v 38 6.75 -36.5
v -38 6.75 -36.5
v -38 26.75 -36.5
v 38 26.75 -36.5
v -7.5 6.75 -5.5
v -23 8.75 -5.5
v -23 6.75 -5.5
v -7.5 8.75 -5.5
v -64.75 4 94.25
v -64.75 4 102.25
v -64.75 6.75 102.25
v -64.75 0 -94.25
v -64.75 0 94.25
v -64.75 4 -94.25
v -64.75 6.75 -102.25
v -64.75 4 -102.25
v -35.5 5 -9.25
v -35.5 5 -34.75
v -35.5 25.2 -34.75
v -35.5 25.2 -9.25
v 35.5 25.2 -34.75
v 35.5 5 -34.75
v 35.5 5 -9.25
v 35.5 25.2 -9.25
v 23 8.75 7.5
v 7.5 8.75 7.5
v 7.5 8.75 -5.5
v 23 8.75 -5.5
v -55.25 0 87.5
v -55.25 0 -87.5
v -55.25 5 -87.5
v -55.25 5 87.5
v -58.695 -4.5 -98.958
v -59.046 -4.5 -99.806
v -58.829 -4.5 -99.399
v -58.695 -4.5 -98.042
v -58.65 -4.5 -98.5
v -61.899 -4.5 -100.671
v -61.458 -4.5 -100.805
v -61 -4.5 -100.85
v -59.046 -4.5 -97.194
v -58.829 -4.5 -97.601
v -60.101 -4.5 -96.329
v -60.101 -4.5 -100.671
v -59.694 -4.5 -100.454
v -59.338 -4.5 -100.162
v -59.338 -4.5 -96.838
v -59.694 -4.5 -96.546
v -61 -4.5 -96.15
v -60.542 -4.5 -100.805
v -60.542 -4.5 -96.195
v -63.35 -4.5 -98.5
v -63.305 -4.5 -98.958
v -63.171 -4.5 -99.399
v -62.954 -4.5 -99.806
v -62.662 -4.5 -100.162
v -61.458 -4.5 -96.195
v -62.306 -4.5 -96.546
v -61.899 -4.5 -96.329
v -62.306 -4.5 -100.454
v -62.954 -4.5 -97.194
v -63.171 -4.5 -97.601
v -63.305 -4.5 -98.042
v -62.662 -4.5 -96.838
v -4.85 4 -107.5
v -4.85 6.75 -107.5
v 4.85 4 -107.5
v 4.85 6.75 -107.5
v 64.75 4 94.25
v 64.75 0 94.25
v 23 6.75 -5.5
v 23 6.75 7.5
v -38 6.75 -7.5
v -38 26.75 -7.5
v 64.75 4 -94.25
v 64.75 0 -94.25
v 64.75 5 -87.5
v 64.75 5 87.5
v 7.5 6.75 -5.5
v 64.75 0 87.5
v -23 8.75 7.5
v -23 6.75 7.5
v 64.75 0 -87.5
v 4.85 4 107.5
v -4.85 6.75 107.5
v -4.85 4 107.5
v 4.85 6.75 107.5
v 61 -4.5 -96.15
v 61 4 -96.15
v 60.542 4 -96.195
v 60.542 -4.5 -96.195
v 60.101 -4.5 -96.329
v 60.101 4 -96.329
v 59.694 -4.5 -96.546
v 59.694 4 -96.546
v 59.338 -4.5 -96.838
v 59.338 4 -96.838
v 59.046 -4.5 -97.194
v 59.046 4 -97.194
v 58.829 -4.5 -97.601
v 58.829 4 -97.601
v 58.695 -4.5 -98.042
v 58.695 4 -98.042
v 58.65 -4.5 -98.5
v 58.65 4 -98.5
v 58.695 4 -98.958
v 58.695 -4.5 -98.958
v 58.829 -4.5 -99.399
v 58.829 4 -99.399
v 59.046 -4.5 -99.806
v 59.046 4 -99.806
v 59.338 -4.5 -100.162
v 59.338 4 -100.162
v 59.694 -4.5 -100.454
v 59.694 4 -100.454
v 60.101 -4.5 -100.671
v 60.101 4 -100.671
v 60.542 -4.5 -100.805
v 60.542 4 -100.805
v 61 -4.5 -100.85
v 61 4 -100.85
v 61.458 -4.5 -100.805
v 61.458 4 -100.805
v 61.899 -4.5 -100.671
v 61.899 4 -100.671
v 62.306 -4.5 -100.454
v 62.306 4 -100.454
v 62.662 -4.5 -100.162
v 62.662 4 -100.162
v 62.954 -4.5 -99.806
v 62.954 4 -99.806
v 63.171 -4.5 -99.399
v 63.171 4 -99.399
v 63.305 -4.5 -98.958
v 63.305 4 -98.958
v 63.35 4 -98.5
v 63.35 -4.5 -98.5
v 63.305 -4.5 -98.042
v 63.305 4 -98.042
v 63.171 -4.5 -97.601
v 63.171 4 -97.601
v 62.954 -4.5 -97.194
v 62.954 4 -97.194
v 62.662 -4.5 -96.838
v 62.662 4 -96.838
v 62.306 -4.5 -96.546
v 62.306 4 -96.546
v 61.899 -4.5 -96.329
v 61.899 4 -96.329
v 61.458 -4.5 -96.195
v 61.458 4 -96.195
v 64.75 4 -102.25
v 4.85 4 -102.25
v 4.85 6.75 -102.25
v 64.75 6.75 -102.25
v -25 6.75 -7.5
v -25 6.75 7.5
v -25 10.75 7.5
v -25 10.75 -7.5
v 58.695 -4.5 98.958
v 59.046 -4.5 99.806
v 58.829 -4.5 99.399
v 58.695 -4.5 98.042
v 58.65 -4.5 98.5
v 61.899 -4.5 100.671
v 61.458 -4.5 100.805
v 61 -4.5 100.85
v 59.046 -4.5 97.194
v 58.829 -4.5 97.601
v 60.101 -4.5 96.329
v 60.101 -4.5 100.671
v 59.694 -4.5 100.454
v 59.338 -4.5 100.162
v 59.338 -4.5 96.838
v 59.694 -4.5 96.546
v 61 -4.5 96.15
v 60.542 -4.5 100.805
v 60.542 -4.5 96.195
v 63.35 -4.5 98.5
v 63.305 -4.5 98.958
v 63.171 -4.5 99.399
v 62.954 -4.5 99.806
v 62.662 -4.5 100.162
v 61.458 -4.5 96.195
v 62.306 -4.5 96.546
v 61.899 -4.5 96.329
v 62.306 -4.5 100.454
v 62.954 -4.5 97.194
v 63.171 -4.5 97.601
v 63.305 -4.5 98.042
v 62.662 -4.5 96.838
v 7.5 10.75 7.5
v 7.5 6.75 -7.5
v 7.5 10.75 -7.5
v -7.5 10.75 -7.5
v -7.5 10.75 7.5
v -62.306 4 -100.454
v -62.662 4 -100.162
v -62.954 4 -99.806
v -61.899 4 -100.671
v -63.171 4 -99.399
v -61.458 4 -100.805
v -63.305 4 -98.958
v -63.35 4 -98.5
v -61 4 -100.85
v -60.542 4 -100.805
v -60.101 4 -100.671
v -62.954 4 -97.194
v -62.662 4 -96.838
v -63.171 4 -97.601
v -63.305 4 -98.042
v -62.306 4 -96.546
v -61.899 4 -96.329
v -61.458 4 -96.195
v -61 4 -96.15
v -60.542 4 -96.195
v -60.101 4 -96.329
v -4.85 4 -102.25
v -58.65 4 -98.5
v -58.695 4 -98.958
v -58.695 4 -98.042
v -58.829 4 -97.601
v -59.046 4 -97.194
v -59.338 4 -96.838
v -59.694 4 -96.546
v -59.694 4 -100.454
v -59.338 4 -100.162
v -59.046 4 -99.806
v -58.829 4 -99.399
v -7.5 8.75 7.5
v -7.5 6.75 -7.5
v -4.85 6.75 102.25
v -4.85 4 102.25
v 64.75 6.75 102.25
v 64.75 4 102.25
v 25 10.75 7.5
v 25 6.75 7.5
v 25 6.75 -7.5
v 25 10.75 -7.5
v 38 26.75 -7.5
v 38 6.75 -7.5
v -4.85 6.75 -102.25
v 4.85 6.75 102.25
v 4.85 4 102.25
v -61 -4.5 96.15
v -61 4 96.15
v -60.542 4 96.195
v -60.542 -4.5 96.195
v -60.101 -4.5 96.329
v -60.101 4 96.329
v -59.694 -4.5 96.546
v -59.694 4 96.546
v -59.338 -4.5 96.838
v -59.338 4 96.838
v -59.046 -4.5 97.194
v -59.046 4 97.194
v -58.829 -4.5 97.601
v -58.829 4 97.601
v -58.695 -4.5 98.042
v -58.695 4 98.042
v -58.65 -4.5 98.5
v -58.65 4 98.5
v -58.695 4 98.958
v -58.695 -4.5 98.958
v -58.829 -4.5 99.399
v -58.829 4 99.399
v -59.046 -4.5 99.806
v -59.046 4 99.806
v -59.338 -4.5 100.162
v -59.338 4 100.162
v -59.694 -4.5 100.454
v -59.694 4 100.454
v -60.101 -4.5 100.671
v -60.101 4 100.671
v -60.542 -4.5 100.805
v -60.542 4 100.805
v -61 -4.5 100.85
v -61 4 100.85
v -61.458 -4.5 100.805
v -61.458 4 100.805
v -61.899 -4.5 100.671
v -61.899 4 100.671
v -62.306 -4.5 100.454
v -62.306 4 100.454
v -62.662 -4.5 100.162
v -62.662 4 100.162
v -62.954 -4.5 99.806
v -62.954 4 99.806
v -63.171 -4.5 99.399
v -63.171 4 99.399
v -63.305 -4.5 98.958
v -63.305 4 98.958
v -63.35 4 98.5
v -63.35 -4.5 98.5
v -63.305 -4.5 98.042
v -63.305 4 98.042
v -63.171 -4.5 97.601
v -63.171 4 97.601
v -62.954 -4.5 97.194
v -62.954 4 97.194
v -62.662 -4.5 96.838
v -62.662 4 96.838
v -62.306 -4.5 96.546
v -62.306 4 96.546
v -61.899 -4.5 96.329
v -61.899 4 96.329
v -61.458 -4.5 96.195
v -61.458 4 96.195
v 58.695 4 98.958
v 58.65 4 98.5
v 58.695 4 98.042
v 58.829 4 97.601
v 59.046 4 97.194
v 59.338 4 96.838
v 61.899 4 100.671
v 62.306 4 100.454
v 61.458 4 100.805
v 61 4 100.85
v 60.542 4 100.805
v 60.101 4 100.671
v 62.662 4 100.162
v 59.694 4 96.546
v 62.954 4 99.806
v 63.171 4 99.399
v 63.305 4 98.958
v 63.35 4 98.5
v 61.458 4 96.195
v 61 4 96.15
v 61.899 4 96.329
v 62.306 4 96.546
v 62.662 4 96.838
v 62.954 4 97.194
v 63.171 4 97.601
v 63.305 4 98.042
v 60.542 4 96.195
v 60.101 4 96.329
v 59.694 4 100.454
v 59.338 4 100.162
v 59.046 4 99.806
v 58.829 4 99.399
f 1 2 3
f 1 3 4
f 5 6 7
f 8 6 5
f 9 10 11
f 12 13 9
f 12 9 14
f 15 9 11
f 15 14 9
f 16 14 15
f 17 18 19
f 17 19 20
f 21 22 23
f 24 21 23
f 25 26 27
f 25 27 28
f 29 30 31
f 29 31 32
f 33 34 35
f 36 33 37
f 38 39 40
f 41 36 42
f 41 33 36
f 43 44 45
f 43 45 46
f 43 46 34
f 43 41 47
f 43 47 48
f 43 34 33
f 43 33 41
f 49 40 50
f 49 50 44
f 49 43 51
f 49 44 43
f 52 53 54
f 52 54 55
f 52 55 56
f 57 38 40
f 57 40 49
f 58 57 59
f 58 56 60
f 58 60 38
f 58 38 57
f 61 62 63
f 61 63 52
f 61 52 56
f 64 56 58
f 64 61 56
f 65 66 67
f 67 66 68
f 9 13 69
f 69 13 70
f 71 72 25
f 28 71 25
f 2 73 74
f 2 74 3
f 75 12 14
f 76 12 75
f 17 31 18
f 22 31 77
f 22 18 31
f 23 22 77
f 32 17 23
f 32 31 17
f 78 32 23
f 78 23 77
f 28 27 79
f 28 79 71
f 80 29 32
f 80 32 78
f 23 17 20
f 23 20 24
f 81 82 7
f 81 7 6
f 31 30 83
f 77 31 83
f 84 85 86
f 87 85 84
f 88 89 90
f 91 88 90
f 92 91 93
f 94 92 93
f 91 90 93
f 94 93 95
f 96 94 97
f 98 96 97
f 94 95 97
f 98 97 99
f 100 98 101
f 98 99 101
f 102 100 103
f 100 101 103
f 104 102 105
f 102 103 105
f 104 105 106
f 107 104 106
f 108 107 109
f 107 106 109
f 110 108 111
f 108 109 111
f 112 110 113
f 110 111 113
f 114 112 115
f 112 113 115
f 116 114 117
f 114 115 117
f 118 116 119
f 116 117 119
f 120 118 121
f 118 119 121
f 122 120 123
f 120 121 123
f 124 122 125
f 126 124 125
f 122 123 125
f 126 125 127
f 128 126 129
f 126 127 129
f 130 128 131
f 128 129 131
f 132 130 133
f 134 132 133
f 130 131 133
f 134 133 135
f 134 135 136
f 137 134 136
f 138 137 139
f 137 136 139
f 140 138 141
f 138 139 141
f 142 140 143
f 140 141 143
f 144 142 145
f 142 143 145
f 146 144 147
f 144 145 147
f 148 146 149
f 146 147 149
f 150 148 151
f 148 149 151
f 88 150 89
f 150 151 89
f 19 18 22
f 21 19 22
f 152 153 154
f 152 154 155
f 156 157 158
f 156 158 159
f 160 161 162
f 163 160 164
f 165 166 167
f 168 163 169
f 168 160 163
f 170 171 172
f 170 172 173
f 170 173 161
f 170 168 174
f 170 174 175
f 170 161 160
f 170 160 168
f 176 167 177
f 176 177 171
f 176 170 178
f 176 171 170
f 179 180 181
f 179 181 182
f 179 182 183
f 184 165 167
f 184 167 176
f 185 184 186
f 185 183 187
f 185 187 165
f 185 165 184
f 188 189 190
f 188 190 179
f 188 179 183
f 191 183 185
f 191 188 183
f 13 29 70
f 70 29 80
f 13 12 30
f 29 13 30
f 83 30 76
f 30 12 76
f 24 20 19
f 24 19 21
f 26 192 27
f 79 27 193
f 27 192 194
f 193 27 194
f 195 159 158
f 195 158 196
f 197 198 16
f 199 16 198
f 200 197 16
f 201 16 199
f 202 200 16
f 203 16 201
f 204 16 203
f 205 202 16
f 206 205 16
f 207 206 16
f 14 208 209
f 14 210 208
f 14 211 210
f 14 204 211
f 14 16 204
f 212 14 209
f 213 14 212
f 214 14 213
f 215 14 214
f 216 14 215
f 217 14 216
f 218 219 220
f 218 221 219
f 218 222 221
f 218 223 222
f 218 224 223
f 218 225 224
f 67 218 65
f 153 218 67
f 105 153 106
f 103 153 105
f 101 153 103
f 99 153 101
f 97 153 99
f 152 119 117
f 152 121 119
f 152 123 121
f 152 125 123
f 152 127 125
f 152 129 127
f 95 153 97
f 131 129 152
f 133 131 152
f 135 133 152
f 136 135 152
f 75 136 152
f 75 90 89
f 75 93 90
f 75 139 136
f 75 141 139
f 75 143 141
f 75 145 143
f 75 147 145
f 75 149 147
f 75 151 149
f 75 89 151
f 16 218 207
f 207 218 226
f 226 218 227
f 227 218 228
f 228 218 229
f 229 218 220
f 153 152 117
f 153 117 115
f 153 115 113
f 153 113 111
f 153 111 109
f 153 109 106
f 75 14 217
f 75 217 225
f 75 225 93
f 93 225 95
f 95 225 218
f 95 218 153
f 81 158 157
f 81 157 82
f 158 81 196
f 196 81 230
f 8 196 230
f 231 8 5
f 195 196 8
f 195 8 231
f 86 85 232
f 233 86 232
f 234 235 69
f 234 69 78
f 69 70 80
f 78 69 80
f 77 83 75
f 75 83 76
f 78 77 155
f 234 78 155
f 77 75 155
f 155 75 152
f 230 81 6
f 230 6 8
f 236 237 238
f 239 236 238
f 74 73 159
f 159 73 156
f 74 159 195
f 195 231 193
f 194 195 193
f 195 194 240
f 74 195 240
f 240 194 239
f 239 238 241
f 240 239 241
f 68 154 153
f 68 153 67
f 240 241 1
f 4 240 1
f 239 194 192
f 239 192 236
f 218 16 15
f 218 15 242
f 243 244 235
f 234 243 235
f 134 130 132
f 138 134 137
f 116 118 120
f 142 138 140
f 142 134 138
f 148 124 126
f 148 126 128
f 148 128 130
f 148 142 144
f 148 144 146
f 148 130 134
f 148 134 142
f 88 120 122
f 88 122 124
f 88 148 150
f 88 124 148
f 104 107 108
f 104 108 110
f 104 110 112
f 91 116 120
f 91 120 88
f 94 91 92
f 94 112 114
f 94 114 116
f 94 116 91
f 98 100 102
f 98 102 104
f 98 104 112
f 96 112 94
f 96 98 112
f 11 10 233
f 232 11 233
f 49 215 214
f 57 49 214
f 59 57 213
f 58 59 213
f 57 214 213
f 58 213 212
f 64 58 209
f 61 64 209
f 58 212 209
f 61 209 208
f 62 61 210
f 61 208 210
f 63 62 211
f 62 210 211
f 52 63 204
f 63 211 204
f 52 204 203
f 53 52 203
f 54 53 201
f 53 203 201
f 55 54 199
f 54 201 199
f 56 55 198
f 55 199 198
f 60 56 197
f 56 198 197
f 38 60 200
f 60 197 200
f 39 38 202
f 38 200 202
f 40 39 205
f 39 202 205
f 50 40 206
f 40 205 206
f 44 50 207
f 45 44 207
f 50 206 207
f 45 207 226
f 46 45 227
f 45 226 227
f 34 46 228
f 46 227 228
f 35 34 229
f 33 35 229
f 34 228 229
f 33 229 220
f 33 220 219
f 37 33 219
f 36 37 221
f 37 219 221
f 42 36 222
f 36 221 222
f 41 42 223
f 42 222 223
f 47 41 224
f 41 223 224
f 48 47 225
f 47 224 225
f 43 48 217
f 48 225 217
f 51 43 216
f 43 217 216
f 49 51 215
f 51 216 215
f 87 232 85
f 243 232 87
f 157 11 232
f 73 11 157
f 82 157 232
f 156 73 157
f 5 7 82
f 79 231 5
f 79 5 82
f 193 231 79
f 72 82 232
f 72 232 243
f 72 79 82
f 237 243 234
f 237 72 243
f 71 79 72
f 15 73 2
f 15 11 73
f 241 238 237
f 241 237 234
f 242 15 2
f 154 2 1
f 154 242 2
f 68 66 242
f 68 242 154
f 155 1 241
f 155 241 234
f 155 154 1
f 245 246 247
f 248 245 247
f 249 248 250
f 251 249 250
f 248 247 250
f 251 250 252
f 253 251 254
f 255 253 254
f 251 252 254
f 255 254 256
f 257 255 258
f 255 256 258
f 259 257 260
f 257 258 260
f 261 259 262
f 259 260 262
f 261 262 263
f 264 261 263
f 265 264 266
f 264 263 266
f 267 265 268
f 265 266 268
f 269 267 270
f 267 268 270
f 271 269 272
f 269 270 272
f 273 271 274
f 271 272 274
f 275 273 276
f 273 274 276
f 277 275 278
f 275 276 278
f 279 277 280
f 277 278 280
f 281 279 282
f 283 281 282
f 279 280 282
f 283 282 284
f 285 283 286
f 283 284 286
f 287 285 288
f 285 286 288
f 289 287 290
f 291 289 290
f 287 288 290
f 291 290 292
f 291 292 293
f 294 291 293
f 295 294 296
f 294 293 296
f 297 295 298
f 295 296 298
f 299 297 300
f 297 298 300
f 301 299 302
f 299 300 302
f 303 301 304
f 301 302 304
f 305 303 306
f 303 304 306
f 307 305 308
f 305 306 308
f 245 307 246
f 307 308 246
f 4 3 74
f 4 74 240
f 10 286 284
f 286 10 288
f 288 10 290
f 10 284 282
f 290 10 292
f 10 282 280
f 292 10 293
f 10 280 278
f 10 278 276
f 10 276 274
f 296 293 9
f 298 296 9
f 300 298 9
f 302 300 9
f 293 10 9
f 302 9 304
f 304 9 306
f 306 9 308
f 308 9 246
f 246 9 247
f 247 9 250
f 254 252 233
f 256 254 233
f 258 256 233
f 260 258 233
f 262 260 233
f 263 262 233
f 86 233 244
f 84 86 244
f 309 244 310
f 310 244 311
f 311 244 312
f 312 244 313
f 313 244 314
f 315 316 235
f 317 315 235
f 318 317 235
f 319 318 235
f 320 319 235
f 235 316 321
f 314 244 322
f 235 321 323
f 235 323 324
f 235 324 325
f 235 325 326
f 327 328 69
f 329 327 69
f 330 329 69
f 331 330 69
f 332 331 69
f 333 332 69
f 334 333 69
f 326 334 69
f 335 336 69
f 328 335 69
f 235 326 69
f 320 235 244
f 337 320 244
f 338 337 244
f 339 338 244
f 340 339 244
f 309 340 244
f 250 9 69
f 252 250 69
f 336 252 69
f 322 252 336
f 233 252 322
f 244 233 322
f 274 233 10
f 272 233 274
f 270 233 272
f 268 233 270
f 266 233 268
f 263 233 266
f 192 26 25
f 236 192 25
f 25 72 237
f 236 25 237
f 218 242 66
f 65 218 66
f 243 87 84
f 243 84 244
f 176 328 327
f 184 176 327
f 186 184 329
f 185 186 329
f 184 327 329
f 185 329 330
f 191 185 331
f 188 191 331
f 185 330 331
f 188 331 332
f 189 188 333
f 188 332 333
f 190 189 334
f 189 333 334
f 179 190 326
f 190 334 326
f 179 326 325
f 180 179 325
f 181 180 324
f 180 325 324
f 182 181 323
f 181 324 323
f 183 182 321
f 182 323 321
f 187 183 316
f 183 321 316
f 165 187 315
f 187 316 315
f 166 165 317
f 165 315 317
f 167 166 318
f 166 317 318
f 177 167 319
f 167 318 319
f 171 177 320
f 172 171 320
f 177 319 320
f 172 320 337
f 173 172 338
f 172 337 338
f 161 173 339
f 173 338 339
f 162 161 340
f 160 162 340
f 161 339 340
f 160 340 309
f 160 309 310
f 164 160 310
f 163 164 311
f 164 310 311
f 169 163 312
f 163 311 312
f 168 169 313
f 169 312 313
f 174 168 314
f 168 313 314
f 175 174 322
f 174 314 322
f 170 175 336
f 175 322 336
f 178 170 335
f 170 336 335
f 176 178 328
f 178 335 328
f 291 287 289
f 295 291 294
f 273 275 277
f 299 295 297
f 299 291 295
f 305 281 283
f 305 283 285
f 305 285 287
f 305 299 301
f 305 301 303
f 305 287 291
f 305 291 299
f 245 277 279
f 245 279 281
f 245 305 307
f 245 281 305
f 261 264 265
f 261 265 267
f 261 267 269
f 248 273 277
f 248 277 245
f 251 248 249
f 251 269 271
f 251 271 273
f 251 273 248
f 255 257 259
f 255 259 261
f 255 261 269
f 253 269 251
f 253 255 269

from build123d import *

# Parameters (mm, degrees)
SKETCH_1_W          = 129.5
SKETCH_1_H          = 204.5
EXTRUDE_1_DEPTH     = 6.75
SKETCH_2_W          = 129.5
SKETCH_2_H          = 8
CUT_EXTRUDE_1_DEPTH = 4
SKETCH_3_R          = 2.35
EXTRUDE_2_DEPTH     = 8.5
SKETCH_4_W          = 120
SKETCH_4_H          = 175
CUT_EXTRUDE_3_DEPTH = 5
SKETCH_5_W          = 9.7
SKETCH_5_H          = 215
EXTRUDE_3_DEPTH     = 2.75
SKETCH_6_W          = 50
SKETCH_6_H          = 15
EXTRUDE_4_DEPTH     = 4
SKETCH_7_W          = 46
SKETCH_7_H          = 2
CUT_EXTRUDE_4_DEPTH = 13
SKETCH_8_W          = 15
SKETCH_8_H          = 15
CUT_EXTRUDE_5_DEPTH = 4
SKETCH_9_W          = 76
SKETCH_9_H          = 29
EXTRUDE_5_DEPTH     = 20
SKETCH_10_W         = 9.7
SKETCH_10_H         = 175
CUT_EXTRUDE_6_DEPTH = 1
SKETCH_11_W         = 71
SKETCH_11_H         = 25.5
CUT_EXTRUDE_8_DEPTH = 20.2


with BuildPart() as part:
    # 草图1 → 凸台-拉伸1 (new body)
    with BuildSketch(Plane(origin=(0, 0, 0), x_dir=(1, 0, 0), z_dir=(0, 1, 0))):
        Rectangle(SKETCH_1_W, SKETCH_1_H)
    extrude(amount=EXTRUDE_1_DEPTH)

    # 草图2 → 切除-拉伸1 (cut)
    with BuildSketch(Plane.XZ):
        with Locations((0, 98.25)):
            Rectangle(SKETCH_2_W, SKETCH_2_H)
        with Locations((0, -98.25)):
            Rectangle(SKETCH_2_W, SKETCH_2_H)
    extrude(amount=-CUT_EXTRUDE_1_DEPTH, mode=Mode.SUBTRACT)

    # 草图3 → 凸台-拉伸2 (add)
    with BuildSketch(Plane.XZ.offset(-4)):
        with Locations(Location((-61, 98.5, 0), (0, 0, 270))):
            Circle(SKETCH_3_R)
        with Locations(Location((61, 98.5, 0), (0, 0, 270))):
            Circle(SKETCH_3_R)
        with Locations(Location((61, -98.5, 0), (0, 0, 90))):
            Circle(SKETCH_3_R)
        with Locations(Location((-61, -98.5, 0), (0, 0, 90))):
            Circle(SKETCH_3_R)
    extrude(amount=EXTRUDE_2_DEPTH)

    # 草图4 → 切除-拉伸3 (cut)
    with BuildSketch(Plane.XZ):
        with Locations((4.75, 0)):
            Rectangle(SKETCH_4_W, SKETCH_4_H)
    extrude(amount=-CUT_EXTRUDE_3_DEPTH, mode=Mode.SUBTRACT)

    # 草图5 → 凸台-拉伸3 (add)
    with BuildSketch(Plane(origin=(0, 6.75, 0), x_dir=(1, 0, 0), z_dir=(0, 1, 0))):
        Rectangle(SKETCH_5_W, SKETCH_5_H)
    extrude(amount=-EXTRUDE_3_DEPTH)

    # 草图6 → 凸台-拉伸4 (add)
    with BuildSketch(Plane(origin=(0, 6.75, 0), x_dir=(1, 0, 0), z_dir=(0, 1, 0))):
        Rectangle(SKETCH_6_W, SKETCH_6_H)
    extrude(amount=EXTRUDE_4_DEPTH)

    # 草图7 → 切除-拉伸4 (cut)
    with BuildSketch(Plane.XY.offset(7.5)):
        with Locations((0, 7.75)):
            Rectangle(SKETCH_7_W, SKETCH_7_H)
    extrude(amount=-CUT_EXTRUDE_4_DEPTH, mode=Mode.SUBTRACT)

    # 草图8 → 切除-拉伸5 (cut)
    with BuildSketch(Plane(origin=(0, 10.75, 0), x_dir=(1, 0, 0), z_dir=(0, 1, 0))):
        Rectangle(SKETCH_8_W, SKETCH_8_H)
    extrude(amount=-CUT_EXTRUDE_5_DEPTH, mode=Mode.SUBTRACT)

    # 草图9 → 凸台-拉伸5 (add)
    with BuildSketch(Plane(origin=(0, 6.75, 0), x_dir=(1, 0, 0), z_dir=(0, 1, 0))):
        with Locations((0, 22)):
            Rectangle(SKETCH_9_W, SKETCH_9_H)
    extrude(amount=EXTRUDE_5_DEPTH)

    # 草图10 → 切除-拉伸6 (cut)
    with BuildSketch(Plane.XZ.offset(-4)):
        Rectangle(SKETCH_10_W, SKETCH_10_H)
    extrude(amount=-CUT_EXTRUDE_6_DEPTH, mode=Mode.SUBTRACT)

    # 草图11 → 切除-拉伸8 (cut)
    with BuildSketch(Plane.XZ.offset(-5)):
        with Locations((0, -22)):
            Rectangle(SKETCH_11_W, SKETCH_11_H)
    extrude(amount=-CUT_EXTRUDE_8_DEPTH, mode=Mode.SUBTRACT)


solid = part.part
